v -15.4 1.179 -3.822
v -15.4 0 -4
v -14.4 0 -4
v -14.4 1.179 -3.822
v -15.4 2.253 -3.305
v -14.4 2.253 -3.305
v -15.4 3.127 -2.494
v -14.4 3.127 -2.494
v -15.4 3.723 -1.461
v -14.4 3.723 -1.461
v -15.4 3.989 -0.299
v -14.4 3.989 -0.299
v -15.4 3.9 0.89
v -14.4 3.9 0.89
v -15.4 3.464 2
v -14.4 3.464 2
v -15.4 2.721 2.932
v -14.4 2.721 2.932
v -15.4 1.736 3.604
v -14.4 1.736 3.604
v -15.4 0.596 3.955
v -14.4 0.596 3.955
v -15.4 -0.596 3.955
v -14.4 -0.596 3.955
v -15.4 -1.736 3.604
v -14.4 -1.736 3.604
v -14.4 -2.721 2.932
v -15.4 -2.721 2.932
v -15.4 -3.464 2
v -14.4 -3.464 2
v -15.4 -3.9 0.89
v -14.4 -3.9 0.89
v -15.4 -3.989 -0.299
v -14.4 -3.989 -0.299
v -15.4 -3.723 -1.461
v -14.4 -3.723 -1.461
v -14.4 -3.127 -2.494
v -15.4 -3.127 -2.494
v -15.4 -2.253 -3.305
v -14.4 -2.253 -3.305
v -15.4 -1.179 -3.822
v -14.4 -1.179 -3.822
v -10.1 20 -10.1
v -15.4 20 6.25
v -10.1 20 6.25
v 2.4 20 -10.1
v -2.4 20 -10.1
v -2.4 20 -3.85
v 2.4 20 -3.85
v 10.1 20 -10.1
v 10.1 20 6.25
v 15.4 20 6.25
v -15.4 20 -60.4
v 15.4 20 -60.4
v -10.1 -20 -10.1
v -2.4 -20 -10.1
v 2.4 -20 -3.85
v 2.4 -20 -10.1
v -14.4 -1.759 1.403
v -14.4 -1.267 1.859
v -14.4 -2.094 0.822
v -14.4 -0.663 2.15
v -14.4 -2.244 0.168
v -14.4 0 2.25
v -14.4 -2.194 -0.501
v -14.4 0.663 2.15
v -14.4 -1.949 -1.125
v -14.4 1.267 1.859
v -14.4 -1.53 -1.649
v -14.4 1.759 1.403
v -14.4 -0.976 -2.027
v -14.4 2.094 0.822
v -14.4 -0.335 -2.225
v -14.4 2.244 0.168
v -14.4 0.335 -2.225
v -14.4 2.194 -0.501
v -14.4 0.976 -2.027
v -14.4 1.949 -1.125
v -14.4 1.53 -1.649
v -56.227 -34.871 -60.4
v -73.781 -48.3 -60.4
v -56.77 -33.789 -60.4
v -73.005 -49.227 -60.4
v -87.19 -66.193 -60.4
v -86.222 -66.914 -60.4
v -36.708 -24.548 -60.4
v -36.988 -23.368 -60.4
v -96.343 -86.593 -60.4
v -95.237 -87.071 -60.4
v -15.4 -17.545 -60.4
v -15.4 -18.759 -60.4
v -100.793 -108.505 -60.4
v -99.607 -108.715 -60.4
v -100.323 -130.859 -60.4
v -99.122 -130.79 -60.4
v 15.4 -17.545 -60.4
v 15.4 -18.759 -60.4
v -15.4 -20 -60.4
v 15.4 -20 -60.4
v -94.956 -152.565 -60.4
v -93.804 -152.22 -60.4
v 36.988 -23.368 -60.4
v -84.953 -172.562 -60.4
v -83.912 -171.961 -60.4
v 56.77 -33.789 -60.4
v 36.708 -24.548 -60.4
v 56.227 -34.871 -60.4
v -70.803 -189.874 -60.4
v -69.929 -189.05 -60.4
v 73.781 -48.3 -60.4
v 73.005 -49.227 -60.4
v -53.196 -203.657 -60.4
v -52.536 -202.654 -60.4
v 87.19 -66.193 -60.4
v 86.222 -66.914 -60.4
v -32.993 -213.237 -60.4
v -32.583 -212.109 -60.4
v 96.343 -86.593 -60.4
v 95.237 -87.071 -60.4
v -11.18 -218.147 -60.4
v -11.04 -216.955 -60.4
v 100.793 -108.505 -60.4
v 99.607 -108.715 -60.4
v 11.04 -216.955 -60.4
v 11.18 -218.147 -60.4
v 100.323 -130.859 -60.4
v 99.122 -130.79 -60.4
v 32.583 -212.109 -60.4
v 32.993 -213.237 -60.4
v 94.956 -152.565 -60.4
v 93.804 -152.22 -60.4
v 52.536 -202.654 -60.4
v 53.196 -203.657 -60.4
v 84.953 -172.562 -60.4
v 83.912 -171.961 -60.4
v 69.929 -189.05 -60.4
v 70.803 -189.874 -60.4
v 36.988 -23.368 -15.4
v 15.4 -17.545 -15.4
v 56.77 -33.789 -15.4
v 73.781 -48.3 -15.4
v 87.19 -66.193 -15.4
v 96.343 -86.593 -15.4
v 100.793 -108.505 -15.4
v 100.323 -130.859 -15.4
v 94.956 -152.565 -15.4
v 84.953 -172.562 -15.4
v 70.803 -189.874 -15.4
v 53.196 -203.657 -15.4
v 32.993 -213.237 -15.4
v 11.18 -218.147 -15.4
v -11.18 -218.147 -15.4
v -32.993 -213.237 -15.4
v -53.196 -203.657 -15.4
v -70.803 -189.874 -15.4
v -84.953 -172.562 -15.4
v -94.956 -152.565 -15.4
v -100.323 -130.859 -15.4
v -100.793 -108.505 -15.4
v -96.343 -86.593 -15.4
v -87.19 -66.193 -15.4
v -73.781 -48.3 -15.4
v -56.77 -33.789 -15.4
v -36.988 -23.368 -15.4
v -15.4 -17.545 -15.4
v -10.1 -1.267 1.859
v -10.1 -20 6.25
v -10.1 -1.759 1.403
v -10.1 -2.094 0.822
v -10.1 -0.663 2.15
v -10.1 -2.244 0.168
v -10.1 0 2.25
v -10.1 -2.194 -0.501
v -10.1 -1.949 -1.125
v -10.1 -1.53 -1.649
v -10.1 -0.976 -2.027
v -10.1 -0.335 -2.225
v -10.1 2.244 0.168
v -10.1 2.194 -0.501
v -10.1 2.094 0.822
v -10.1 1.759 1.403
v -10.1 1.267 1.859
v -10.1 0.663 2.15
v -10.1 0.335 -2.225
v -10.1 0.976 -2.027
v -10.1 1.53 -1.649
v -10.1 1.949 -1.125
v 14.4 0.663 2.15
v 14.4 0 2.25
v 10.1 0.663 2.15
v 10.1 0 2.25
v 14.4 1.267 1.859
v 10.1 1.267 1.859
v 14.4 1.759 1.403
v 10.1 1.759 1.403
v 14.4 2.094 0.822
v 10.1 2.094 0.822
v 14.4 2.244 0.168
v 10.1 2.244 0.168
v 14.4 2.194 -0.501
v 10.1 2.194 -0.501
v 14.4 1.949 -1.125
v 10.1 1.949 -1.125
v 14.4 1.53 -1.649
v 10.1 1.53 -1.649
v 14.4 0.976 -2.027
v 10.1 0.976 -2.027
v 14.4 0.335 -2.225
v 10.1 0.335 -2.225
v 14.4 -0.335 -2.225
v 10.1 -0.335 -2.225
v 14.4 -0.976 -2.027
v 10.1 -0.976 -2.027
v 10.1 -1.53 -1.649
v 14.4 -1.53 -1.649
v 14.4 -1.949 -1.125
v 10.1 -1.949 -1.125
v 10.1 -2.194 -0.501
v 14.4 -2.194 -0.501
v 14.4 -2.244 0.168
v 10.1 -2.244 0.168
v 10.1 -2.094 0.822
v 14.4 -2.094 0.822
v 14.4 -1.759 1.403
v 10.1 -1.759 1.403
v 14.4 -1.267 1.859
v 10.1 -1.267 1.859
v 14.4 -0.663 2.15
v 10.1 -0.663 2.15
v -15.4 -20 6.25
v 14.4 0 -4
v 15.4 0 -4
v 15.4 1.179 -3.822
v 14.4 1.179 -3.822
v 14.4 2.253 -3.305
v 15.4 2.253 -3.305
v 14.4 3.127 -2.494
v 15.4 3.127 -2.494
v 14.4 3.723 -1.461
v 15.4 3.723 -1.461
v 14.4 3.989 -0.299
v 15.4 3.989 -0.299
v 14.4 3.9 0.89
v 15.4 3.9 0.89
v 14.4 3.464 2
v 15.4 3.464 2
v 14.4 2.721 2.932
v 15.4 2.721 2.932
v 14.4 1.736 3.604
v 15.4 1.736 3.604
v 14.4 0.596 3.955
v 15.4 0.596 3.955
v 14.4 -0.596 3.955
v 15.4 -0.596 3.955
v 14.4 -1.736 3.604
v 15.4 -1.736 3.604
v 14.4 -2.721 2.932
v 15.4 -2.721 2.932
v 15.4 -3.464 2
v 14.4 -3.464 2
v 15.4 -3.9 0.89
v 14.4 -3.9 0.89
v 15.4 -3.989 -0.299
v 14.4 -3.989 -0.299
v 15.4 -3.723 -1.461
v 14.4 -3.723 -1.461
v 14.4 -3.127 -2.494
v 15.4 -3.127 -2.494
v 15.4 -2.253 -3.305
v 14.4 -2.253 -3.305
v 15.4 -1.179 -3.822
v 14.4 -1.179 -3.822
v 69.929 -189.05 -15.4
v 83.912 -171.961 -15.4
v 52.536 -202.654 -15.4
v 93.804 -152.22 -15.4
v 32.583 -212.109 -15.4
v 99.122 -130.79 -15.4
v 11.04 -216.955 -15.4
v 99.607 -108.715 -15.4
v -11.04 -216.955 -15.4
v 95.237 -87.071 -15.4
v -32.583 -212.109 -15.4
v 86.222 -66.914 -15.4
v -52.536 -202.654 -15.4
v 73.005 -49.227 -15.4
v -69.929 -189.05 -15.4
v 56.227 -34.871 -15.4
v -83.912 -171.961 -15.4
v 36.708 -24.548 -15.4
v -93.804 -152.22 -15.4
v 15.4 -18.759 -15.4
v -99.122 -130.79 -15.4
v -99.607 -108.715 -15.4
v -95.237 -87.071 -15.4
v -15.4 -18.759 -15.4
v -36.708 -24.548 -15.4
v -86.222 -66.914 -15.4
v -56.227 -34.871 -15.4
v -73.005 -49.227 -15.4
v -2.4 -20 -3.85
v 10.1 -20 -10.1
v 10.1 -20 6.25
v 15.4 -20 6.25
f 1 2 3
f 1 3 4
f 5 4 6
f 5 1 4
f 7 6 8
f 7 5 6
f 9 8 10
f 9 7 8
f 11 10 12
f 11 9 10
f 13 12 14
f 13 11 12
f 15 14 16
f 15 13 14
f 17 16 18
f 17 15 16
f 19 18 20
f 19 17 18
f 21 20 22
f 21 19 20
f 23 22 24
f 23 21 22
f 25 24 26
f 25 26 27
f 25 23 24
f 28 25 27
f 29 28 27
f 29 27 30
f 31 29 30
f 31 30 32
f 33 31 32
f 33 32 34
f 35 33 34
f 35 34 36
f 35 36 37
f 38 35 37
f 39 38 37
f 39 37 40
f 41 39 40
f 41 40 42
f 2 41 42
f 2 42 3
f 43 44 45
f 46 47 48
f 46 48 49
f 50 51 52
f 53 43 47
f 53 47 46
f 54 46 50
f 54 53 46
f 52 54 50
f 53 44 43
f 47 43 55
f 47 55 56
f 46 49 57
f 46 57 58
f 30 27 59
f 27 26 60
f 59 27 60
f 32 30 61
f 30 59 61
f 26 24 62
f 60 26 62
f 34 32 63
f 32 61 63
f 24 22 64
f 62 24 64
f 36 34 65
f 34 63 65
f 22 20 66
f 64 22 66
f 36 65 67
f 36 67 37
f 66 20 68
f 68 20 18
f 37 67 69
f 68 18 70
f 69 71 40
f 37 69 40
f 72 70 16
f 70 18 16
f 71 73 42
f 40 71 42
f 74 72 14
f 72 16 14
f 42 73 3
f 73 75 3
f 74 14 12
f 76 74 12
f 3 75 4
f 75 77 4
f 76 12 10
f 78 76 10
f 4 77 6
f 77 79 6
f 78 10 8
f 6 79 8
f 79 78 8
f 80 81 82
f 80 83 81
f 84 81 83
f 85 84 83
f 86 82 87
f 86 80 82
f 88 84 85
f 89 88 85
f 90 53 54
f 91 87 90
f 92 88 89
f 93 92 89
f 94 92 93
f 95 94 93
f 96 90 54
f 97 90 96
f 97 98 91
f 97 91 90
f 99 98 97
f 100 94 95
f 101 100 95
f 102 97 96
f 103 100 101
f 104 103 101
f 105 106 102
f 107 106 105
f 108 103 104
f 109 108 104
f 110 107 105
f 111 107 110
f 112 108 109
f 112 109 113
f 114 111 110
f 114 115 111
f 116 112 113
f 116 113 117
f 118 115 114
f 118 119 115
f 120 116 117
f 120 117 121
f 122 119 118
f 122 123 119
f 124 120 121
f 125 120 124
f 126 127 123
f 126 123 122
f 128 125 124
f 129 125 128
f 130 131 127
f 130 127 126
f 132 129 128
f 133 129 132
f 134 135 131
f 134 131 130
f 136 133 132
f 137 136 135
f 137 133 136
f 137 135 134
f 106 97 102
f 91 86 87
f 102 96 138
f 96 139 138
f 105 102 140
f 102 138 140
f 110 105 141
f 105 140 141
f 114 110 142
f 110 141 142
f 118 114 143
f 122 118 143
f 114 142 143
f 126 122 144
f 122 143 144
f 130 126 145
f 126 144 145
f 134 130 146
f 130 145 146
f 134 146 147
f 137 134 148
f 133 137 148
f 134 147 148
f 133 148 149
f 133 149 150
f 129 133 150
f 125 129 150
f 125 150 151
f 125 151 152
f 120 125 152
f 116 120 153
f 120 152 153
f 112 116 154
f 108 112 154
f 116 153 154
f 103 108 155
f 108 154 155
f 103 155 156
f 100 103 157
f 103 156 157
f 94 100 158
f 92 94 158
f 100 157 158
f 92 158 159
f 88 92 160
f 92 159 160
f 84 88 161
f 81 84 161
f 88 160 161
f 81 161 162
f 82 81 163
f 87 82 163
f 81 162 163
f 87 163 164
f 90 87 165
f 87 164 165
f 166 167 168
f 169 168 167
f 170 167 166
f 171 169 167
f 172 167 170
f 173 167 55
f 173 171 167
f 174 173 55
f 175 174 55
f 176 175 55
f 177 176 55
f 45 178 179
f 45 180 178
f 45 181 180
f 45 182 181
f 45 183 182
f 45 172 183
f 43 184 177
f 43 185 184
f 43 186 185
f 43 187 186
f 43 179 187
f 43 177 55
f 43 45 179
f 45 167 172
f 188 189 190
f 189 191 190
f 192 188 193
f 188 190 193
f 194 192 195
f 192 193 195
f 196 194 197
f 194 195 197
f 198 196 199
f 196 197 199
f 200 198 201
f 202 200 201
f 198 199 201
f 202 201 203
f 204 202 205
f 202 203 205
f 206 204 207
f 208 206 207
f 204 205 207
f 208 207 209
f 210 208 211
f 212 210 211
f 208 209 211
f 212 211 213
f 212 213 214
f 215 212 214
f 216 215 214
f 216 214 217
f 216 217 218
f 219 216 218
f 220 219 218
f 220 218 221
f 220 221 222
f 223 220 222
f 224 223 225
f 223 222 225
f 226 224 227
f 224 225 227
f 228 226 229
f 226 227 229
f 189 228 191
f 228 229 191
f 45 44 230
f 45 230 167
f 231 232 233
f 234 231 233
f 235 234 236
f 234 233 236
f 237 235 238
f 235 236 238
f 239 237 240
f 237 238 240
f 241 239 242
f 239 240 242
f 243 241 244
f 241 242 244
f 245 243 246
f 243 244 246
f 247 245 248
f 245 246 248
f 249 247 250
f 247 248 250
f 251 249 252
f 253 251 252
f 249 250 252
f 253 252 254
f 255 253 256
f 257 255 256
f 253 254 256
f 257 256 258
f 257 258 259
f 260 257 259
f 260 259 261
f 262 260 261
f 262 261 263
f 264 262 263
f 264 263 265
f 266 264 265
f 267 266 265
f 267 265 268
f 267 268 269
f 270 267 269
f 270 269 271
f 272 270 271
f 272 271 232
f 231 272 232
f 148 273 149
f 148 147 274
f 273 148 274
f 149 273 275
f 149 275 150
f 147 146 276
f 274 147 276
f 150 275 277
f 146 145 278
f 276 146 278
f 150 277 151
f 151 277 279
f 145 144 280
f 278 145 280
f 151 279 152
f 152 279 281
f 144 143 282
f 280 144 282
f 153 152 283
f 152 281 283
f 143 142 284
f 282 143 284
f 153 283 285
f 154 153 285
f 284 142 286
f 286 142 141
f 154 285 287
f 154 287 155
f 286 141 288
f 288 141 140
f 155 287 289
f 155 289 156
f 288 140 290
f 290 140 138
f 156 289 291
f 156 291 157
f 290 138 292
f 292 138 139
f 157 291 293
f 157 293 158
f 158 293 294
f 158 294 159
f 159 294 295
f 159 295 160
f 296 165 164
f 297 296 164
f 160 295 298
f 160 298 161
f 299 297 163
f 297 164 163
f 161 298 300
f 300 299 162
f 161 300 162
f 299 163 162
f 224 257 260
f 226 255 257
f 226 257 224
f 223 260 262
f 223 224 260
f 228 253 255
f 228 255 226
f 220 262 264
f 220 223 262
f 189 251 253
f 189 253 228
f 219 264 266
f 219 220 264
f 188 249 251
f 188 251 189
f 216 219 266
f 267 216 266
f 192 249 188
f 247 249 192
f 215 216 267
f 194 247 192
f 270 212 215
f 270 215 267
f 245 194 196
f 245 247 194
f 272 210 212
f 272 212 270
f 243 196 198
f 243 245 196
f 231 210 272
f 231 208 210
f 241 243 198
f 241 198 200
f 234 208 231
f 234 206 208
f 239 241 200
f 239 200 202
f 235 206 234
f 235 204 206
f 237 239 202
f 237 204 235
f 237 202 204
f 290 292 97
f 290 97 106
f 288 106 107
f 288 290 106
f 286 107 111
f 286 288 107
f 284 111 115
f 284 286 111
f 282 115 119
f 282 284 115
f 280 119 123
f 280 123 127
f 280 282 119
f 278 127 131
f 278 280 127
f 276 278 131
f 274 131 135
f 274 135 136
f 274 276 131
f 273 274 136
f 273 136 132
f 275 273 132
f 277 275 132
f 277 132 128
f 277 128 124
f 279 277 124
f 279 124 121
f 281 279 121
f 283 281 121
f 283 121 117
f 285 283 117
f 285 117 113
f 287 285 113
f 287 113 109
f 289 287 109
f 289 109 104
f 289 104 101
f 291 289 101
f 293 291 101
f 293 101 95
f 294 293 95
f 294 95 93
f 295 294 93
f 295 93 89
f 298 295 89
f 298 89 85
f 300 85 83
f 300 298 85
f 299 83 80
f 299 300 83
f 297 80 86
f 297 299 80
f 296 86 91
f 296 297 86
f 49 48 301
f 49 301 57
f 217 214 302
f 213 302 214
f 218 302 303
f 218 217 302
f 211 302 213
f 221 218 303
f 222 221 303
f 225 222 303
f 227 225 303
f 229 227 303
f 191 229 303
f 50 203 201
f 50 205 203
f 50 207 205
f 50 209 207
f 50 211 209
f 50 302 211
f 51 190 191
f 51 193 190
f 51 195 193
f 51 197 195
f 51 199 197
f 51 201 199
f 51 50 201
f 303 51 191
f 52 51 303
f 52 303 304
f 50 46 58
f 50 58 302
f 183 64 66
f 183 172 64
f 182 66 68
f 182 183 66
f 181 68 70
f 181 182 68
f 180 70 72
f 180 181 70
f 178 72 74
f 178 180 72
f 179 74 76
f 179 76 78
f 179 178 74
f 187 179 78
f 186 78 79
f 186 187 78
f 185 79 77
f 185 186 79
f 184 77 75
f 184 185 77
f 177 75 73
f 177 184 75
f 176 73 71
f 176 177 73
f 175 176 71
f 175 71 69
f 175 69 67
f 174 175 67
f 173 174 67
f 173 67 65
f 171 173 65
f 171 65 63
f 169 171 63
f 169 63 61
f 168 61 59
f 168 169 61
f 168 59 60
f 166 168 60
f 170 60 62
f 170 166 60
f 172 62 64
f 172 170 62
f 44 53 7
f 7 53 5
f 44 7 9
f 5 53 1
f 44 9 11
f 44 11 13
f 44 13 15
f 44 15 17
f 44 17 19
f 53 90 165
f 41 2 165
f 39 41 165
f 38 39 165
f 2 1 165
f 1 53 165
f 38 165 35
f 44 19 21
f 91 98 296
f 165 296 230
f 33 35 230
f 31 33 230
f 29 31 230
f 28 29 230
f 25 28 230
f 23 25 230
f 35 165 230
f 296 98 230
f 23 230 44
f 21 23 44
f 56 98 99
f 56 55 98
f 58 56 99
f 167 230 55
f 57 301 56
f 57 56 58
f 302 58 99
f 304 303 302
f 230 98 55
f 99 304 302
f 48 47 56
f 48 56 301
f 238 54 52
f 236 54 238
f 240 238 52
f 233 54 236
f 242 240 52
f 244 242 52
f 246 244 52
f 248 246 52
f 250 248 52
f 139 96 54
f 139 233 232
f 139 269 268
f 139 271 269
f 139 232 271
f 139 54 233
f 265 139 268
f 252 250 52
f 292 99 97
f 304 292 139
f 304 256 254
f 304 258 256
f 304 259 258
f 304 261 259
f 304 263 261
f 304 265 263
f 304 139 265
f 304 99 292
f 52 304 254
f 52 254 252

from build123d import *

# Parameters (mm, degrees)
BOSS_EXTRU_1_DEPTH                                = 20
CHAMBRAGE_POUR_VIS_SIX_PANS_CREUX_M41_D           = 4.5
CHAMBRAGE_POUR_VIS_SIX_PANS_CREUX_M41_DEPTH       = 11.55
CHAMBRAGE_POUR_VIS_SIX_PANS_CREUX_M41_CBORE_D     = 8
CHAMBRAGE_POUR_VIS_SIX_PANS_CREUX_M41_CBORE_DEPTH = 1
ESQUISSE6_W                                       = 20.2
ESQUISSE6_H                                       = 40
ENL_V_MAT_EXTRU_1_DEPTH                           = 3
ESQUISSE16_R                                      = 101.2
ESQUISSE16_R_2                                    = 100
EXTRU_MINCE1_DEPTH                                = 45
ESQUISSE14_W                                      = 30.8
ESQUISSE14_H                                      = 45
BOSS_EXTRU_3_DEPTH                                = 40


with BuildPart() as part:
    # Base → Boss.-Extru.1 (new, symmetric)
    with BuildSketch(Plane(origin=(0, 0, 0), x_dir=(1, 0, 0), z_dir=(0, 1, 0))):
        Polygon((-3.85, -2.4), (-3.85, 2.4), (-10.1, 2.4), (-10.1, 10.1), (-2.4, 10.1), (-2.4, 3.85), (2.4, 3.85), (2.4, 10.1), (10.1, 10.1), (10.1, 2.4), (3.85, 2.4), (3.85, -2.4), (10.1, -2.4), (10.1, -6.25), (15.4, -6.25), (15.4, 15.4), (-15.4, 15.4), (-15.4, -6.25), (-10.1, -6.25), (-10.1, -2.4), align=None)
    extrude(amount=BOSS_EXTRU_1_DEPTH, both=True)

    # Chambrage pour vis à six pans creux M41
    with Locations(Plane(origin=(15.4, 0, 0), x_dir=(0, 0, -1), z_dir=(1, 0, 0))):
        with Locations((0, 0)):
            chambrage_pour_vis_six_pans_creux_m41 = CounterBoreHole(CHAMBRAGE_POUR_VIS_SIX_PANS_CREUX_M41_D / 2, CHAMBRAGE_POUR_VIS_SIX_PANS_CREUX_M41_CBORE_D / 2, CHAMBRAGE_POUR_VIS_SIX_PANS_CREUX_M41_CBORE_DEPTH, depth=CHAMBRAGE_POUR_VIS_SIX_PANS_CREUX_M41_DEPTH)

    # Symétrie1: Chambrage pour vis à six pans creux M41 across plane
    add(chambrage_pour_vis_six_pans_creux_m41.mirror(Plane(origin=(0, 0, 0), x_dir=(0, 0, 1), z_dir=(1, 0, 0))), mode=Mode.SUBTRACT)

    # Esquisse6 → Enlèv. mat.-Extru.1 (cut, symmetric)
    with BuildSketch(Plane.XY):
        Rectangle(ESQUISSE6_W, ESQUISSE6_H)
    extrude(amount=ENL_V_MAT_EXTRU_1_DEPTH, both=True, mode=Mode.SUBTRACT)

    # Esquisse16 → Extru.-Mince1 (add)
    with BuildSketch(Plane(origin=(0, 0, -15.4), x_dir=(-1, 0, 0), z_dir=(0, 0, -1))):
        with Locations((0, -117.566500624)):
            Circle(ESQUISSE16_R)
        with Locations((0, -117.566500624)):
            Circle(ESQUISSE16_R_2, mode=Mode.SUBTRACT)
    extrude(amount=EXTRU_MINCE1_DEPTH)

    # Esquisse14 → Boss.-Extru.3 (add)
    with BuildSketch(Plane.XZ.offset(20)):
        with Locations((0, -37.9)):
            Rectangle(ESQUISSE14_W, ESQUISSE14_H)
    extrude(amount=-BOSS_EXTRU_3_DEPTH)


solid = part.part
